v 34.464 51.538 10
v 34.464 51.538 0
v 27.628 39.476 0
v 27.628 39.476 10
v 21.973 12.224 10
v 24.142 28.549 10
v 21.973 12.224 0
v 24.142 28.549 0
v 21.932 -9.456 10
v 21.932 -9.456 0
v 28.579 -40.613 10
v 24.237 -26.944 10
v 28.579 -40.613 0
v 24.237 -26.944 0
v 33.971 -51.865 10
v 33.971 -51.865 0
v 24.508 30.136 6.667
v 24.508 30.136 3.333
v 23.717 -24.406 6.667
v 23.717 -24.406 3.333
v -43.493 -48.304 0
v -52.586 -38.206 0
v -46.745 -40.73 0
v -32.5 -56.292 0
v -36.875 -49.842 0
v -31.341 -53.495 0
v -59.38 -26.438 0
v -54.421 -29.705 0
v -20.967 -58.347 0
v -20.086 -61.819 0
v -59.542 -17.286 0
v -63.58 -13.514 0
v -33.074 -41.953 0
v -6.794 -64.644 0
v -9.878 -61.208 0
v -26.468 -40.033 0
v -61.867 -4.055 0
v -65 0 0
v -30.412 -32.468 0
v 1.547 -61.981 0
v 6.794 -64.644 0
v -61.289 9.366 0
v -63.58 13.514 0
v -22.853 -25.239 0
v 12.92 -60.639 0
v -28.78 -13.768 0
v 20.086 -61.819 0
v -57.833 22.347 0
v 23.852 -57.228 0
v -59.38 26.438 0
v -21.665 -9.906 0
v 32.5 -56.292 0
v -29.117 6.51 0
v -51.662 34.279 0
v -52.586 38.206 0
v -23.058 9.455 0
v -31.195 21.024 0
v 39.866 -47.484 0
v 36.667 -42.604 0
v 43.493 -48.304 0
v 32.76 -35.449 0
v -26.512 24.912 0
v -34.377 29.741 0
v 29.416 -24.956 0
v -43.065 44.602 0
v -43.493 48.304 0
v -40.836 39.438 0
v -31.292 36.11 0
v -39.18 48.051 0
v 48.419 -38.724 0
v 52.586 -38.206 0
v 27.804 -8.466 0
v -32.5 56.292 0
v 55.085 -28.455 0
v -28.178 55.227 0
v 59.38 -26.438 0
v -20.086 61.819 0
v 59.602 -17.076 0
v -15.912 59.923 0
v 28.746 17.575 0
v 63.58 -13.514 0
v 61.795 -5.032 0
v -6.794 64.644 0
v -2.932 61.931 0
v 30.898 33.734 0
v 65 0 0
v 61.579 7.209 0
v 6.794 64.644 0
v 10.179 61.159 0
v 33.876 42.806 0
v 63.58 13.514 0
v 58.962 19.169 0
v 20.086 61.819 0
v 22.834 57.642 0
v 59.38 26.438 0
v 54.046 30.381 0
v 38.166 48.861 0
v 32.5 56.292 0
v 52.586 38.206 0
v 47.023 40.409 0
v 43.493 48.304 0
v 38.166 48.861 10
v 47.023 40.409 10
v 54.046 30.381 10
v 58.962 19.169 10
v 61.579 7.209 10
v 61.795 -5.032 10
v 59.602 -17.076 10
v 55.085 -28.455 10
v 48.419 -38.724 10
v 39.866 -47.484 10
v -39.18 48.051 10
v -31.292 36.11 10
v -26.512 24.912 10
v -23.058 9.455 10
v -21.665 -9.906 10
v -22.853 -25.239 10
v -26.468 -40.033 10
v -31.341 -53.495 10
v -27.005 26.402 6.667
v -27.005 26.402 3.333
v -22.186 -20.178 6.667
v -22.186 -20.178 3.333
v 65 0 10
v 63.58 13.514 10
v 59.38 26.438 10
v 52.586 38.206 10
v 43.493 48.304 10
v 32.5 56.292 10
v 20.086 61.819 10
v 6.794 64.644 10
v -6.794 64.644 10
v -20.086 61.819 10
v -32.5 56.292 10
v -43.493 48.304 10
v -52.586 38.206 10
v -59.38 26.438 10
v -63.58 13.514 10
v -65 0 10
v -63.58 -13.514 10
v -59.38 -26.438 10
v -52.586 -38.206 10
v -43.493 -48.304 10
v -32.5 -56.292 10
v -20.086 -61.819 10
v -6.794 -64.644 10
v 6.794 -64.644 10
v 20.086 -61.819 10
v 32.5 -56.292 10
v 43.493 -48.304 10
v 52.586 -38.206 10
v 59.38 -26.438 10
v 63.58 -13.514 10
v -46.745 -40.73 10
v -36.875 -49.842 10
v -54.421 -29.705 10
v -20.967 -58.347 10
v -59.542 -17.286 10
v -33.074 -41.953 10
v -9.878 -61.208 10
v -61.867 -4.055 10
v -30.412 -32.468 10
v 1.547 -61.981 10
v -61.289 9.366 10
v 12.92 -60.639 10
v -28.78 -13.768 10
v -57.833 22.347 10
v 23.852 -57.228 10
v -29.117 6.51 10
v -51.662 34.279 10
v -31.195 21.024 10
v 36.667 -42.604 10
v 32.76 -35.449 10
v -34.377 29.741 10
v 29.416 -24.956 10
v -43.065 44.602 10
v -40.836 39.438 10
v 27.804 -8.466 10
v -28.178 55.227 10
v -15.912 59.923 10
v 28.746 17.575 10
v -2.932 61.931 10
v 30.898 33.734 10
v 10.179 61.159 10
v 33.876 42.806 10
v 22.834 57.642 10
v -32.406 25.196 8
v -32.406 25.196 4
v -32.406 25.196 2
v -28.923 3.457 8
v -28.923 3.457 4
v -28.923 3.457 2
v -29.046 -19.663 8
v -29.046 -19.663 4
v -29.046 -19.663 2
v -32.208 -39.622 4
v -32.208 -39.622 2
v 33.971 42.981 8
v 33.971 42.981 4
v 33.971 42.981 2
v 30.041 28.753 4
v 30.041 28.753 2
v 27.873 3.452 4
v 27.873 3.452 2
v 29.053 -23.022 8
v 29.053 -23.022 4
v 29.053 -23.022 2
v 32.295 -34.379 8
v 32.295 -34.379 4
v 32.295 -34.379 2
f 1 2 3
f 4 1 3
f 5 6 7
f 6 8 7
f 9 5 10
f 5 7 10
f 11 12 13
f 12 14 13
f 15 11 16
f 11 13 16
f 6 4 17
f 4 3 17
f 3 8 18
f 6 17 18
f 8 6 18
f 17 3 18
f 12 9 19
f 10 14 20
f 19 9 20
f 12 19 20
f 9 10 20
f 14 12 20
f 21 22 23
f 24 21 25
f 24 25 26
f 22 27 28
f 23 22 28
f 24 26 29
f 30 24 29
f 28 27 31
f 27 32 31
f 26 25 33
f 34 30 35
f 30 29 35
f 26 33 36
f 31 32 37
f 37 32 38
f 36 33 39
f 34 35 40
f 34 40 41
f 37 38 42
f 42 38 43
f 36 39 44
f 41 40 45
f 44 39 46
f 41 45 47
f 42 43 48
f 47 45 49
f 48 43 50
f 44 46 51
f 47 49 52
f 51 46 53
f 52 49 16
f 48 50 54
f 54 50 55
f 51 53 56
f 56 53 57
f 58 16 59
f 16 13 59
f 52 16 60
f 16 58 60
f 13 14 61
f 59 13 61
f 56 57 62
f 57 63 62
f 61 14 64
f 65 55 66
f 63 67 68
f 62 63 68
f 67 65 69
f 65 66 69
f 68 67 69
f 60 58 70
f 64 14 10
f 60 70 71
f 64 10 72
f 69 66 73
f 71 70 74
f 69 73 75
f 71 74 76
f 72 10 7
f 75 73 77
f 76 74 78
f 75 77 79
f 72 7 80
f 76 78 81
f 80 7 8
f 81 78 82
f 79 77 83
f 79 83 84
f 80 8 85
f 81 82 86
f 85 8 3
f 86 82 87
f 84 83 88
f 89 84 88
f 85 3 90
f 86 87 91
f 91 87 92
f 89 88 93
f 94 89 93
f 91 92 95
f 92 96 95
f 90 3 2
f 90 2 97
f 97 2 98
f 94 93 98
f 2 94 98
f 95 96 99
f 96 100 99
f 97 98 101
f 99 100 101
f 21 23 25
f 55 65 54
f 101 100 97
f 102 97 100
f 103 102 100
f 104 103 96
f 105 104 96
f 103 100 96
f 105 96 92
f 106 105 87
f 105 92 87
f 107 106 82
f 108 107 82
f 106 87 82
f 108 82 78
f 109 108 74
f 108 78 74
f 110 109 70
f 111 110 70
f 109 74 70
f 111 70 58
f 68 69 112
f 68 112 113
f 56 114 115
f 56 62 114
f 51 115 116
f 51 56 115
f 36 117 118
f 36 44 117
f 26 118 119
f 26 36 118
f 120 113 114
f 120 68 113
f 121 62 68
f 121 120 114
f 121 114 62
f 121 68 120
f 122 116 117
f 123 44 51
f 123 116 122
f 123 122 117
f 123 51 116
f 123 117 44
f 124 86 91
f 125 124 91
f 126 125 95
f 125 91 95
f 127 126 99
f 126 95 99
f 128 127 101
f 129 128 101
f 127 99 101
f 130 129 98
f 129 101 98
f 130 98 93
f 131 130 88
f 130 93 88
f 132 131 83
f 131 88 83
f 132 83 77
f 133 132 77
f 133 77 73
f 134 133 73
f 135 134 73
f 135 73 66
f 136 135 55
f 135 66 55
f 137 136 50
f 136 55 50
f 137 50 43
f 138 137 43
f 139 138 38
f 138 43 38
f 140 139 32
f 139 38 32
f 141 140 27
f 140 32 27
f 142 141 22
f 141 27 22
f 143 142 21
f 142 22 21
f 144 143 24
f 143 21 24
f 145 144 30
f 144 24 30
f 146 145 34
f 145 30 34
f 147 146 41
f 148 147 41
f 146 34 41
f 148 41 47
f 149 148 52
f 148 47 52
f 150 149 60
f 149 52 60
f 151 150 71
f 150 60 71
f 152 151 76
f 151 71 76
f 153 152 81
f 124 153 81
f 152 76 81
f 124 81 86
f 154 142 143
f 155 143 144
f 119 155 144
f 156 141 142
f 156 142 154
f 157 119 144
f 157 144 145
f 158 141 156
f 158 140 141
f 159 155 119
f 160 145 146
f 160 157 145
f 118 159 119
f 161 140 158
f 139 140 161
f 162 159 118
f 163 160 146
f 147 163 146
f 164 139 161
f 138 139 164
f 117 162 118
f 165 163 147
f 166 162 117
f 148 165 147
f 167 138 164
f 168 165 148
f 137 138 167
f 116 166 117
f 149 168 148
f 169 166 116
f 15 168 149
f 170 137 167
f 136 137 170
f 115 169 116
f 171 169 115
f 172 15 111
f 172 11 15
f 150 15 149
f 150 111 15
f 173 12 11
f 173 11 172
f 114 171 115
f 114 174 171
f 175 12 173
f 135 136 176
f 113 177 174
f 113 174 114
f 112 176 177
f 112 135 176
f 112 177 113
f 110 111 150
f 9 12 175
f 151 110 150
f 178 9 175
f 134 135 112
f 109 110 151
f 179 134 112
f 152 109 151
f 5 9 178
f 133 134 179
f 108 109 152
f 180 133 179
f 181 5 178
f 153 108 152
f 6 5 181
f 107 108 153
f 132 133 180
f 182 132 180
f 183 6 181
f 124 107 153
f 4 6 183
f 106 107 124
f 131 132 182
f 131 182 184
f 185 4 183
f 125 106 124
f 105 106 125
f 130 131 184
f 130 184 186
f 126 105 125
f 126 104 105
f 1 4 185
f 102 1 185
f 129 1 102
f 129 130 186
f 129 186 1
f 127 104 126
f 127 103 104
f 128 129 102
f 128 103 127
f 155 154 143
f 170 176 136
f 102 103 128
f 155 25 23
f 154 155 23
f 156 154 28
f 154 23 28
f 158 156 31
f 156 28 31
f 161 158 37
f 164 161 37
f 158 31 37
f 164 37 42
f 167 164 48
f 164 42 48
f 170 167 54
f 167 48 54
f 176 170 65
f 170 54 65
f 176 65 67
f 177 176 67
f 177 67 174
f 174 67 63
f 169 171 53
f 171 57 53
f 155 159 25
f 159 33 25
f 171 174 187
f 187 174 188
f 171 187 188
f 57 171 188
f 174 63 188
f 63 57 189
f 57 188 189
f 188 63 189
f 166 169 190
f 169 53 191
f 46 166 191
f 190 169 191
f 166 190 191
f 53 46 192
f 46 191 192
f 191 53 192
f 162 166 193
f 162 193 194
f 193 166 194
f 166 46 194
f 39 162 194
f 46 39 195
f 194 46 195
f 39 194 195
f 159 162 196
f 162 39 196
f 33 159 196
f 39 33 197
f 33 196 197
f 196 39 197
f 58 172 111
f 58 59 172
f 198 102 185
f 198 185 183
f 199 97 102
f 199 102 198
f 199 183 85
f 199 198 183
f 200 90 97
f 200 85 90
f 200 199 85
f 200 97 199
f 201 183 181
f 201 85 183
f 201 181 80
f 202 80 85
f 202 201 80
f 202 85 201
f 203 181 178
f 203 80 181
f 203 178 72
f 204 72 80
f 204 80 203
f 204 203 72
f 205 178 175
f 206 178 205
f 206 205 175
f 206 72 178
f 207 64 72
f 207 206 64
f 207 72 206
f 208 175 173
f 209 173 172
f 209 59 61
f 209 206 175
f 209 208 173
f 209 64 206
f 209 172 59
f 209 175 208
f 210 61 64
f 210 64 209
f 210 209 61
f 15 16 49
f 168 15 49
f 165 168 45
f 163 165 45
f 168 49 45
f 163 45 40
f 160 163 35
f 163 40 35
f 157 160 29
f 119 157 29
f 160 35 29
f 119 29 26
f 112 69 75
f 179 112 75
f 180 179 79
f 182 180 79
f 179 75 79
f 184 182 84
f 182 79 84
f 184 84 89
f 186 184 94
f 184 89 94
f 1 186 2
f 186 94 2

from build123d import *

# Parameters (mm, degrees)
F0_R     = 65
F1_DEPTH = 10


with BuildPart() as f1:
    # F0 (on Top) → F1 (new body)
    with BuildSketch(Plane.XY):
        Circle(F0_R)
        with BuildLine():
            ThreePointArc((-36.8746095084, -49.8423833058), (-61.8672343645, -4.055281999), (-43.0652938596, 44.6024715099))
            add(Edge.make_bspline(
                [(-43.0652938596, 44.6024715099), (-42.5033416405, 42.8911841499), (-40.9709017736, 38.303872311), (-28.4517087875, 25.7155025347), (-28.1837010223, -19.7066171871), (-31.1944319439, -39.0345282475), (-35.1854456212, -46.6187002101), (-36.8746095084, -49.8423833058)],
                knots=[0, 0, 0, 0, 0.1152986287, 0.3074272184, 0.6265847555, 0.8404975198, 1, 1, 1, 1], degree=3))
        make_face(mode=Mode.SUBTRACT)
        with BuildLine():
            add(Edge.make_bspline(
                [(-39.1798144104, 48.0514530765), (-34.6986380376, 41.8919884344), (-24.039370044, 27.2507644636), (-18.9528770593, -21.226282887), (-27.429139563, -43.304054129), (-31.3406179812, -53.495473309)],
                knots=[0, 0, 0, 0, 0.2814883048, 0.6679982518, 1, 1, 1, 1], degree=3))
            ThreePointArc((-39.1798144104, 48.0514530765), (-2.9323690605, 61.9306161094), (34.4643059461, 51.5384479361))
            add(Edge.make_bspline(
                [(34.4643059461, 51.5384479361), (30.6732095502, 45.6977064492), (21.0860305134, 30.9349836199), (20.4771082518, -25.5791064122), (29.9719090924, -44.0670076219), (33.9708584681, -51.8650245825)],
                knots=[0, 0, 0, 0, 0.2751403863, 0.6933987291, 1, 1, 1, 1], degree=3))
            ThreePointArc((33.9708584681, -51.8650245825), (1.5472982961, -61.9806894765), (-31.3406179812, -53.495473309))
        make_face(mode=Mode.SUBTRACT)
        with BuildLine():
            add(Edge.make_bspline(
                [(38.1658426028, 48.8607046451), (36.6822734458, 47.0441253501), (33.0431017142, 42.5919373879), (28.9205676695, 28.2980702425), (25.5719986033, -23.1181205281), (35.5872991076, -41.153613441), (38.716637719, -45.7833935118), (39.8659837323, -47.4837165885)],
                knots=[0, 0, 0, 0, 0.1291357873, 0.3137498794, 0.6595357661, 0.8748375082, 1, 1, 1, 1], degree=3))
            ThreePointArc((38.1658426028, 48.8607046451), (61.9903488941, 1.0939122415), (39.8659837323, -47.4837165885))
        make_face(mode=Mode.SUBTRACT)
    extrude(amount=F1_DEPTH)


solid = f1.part
